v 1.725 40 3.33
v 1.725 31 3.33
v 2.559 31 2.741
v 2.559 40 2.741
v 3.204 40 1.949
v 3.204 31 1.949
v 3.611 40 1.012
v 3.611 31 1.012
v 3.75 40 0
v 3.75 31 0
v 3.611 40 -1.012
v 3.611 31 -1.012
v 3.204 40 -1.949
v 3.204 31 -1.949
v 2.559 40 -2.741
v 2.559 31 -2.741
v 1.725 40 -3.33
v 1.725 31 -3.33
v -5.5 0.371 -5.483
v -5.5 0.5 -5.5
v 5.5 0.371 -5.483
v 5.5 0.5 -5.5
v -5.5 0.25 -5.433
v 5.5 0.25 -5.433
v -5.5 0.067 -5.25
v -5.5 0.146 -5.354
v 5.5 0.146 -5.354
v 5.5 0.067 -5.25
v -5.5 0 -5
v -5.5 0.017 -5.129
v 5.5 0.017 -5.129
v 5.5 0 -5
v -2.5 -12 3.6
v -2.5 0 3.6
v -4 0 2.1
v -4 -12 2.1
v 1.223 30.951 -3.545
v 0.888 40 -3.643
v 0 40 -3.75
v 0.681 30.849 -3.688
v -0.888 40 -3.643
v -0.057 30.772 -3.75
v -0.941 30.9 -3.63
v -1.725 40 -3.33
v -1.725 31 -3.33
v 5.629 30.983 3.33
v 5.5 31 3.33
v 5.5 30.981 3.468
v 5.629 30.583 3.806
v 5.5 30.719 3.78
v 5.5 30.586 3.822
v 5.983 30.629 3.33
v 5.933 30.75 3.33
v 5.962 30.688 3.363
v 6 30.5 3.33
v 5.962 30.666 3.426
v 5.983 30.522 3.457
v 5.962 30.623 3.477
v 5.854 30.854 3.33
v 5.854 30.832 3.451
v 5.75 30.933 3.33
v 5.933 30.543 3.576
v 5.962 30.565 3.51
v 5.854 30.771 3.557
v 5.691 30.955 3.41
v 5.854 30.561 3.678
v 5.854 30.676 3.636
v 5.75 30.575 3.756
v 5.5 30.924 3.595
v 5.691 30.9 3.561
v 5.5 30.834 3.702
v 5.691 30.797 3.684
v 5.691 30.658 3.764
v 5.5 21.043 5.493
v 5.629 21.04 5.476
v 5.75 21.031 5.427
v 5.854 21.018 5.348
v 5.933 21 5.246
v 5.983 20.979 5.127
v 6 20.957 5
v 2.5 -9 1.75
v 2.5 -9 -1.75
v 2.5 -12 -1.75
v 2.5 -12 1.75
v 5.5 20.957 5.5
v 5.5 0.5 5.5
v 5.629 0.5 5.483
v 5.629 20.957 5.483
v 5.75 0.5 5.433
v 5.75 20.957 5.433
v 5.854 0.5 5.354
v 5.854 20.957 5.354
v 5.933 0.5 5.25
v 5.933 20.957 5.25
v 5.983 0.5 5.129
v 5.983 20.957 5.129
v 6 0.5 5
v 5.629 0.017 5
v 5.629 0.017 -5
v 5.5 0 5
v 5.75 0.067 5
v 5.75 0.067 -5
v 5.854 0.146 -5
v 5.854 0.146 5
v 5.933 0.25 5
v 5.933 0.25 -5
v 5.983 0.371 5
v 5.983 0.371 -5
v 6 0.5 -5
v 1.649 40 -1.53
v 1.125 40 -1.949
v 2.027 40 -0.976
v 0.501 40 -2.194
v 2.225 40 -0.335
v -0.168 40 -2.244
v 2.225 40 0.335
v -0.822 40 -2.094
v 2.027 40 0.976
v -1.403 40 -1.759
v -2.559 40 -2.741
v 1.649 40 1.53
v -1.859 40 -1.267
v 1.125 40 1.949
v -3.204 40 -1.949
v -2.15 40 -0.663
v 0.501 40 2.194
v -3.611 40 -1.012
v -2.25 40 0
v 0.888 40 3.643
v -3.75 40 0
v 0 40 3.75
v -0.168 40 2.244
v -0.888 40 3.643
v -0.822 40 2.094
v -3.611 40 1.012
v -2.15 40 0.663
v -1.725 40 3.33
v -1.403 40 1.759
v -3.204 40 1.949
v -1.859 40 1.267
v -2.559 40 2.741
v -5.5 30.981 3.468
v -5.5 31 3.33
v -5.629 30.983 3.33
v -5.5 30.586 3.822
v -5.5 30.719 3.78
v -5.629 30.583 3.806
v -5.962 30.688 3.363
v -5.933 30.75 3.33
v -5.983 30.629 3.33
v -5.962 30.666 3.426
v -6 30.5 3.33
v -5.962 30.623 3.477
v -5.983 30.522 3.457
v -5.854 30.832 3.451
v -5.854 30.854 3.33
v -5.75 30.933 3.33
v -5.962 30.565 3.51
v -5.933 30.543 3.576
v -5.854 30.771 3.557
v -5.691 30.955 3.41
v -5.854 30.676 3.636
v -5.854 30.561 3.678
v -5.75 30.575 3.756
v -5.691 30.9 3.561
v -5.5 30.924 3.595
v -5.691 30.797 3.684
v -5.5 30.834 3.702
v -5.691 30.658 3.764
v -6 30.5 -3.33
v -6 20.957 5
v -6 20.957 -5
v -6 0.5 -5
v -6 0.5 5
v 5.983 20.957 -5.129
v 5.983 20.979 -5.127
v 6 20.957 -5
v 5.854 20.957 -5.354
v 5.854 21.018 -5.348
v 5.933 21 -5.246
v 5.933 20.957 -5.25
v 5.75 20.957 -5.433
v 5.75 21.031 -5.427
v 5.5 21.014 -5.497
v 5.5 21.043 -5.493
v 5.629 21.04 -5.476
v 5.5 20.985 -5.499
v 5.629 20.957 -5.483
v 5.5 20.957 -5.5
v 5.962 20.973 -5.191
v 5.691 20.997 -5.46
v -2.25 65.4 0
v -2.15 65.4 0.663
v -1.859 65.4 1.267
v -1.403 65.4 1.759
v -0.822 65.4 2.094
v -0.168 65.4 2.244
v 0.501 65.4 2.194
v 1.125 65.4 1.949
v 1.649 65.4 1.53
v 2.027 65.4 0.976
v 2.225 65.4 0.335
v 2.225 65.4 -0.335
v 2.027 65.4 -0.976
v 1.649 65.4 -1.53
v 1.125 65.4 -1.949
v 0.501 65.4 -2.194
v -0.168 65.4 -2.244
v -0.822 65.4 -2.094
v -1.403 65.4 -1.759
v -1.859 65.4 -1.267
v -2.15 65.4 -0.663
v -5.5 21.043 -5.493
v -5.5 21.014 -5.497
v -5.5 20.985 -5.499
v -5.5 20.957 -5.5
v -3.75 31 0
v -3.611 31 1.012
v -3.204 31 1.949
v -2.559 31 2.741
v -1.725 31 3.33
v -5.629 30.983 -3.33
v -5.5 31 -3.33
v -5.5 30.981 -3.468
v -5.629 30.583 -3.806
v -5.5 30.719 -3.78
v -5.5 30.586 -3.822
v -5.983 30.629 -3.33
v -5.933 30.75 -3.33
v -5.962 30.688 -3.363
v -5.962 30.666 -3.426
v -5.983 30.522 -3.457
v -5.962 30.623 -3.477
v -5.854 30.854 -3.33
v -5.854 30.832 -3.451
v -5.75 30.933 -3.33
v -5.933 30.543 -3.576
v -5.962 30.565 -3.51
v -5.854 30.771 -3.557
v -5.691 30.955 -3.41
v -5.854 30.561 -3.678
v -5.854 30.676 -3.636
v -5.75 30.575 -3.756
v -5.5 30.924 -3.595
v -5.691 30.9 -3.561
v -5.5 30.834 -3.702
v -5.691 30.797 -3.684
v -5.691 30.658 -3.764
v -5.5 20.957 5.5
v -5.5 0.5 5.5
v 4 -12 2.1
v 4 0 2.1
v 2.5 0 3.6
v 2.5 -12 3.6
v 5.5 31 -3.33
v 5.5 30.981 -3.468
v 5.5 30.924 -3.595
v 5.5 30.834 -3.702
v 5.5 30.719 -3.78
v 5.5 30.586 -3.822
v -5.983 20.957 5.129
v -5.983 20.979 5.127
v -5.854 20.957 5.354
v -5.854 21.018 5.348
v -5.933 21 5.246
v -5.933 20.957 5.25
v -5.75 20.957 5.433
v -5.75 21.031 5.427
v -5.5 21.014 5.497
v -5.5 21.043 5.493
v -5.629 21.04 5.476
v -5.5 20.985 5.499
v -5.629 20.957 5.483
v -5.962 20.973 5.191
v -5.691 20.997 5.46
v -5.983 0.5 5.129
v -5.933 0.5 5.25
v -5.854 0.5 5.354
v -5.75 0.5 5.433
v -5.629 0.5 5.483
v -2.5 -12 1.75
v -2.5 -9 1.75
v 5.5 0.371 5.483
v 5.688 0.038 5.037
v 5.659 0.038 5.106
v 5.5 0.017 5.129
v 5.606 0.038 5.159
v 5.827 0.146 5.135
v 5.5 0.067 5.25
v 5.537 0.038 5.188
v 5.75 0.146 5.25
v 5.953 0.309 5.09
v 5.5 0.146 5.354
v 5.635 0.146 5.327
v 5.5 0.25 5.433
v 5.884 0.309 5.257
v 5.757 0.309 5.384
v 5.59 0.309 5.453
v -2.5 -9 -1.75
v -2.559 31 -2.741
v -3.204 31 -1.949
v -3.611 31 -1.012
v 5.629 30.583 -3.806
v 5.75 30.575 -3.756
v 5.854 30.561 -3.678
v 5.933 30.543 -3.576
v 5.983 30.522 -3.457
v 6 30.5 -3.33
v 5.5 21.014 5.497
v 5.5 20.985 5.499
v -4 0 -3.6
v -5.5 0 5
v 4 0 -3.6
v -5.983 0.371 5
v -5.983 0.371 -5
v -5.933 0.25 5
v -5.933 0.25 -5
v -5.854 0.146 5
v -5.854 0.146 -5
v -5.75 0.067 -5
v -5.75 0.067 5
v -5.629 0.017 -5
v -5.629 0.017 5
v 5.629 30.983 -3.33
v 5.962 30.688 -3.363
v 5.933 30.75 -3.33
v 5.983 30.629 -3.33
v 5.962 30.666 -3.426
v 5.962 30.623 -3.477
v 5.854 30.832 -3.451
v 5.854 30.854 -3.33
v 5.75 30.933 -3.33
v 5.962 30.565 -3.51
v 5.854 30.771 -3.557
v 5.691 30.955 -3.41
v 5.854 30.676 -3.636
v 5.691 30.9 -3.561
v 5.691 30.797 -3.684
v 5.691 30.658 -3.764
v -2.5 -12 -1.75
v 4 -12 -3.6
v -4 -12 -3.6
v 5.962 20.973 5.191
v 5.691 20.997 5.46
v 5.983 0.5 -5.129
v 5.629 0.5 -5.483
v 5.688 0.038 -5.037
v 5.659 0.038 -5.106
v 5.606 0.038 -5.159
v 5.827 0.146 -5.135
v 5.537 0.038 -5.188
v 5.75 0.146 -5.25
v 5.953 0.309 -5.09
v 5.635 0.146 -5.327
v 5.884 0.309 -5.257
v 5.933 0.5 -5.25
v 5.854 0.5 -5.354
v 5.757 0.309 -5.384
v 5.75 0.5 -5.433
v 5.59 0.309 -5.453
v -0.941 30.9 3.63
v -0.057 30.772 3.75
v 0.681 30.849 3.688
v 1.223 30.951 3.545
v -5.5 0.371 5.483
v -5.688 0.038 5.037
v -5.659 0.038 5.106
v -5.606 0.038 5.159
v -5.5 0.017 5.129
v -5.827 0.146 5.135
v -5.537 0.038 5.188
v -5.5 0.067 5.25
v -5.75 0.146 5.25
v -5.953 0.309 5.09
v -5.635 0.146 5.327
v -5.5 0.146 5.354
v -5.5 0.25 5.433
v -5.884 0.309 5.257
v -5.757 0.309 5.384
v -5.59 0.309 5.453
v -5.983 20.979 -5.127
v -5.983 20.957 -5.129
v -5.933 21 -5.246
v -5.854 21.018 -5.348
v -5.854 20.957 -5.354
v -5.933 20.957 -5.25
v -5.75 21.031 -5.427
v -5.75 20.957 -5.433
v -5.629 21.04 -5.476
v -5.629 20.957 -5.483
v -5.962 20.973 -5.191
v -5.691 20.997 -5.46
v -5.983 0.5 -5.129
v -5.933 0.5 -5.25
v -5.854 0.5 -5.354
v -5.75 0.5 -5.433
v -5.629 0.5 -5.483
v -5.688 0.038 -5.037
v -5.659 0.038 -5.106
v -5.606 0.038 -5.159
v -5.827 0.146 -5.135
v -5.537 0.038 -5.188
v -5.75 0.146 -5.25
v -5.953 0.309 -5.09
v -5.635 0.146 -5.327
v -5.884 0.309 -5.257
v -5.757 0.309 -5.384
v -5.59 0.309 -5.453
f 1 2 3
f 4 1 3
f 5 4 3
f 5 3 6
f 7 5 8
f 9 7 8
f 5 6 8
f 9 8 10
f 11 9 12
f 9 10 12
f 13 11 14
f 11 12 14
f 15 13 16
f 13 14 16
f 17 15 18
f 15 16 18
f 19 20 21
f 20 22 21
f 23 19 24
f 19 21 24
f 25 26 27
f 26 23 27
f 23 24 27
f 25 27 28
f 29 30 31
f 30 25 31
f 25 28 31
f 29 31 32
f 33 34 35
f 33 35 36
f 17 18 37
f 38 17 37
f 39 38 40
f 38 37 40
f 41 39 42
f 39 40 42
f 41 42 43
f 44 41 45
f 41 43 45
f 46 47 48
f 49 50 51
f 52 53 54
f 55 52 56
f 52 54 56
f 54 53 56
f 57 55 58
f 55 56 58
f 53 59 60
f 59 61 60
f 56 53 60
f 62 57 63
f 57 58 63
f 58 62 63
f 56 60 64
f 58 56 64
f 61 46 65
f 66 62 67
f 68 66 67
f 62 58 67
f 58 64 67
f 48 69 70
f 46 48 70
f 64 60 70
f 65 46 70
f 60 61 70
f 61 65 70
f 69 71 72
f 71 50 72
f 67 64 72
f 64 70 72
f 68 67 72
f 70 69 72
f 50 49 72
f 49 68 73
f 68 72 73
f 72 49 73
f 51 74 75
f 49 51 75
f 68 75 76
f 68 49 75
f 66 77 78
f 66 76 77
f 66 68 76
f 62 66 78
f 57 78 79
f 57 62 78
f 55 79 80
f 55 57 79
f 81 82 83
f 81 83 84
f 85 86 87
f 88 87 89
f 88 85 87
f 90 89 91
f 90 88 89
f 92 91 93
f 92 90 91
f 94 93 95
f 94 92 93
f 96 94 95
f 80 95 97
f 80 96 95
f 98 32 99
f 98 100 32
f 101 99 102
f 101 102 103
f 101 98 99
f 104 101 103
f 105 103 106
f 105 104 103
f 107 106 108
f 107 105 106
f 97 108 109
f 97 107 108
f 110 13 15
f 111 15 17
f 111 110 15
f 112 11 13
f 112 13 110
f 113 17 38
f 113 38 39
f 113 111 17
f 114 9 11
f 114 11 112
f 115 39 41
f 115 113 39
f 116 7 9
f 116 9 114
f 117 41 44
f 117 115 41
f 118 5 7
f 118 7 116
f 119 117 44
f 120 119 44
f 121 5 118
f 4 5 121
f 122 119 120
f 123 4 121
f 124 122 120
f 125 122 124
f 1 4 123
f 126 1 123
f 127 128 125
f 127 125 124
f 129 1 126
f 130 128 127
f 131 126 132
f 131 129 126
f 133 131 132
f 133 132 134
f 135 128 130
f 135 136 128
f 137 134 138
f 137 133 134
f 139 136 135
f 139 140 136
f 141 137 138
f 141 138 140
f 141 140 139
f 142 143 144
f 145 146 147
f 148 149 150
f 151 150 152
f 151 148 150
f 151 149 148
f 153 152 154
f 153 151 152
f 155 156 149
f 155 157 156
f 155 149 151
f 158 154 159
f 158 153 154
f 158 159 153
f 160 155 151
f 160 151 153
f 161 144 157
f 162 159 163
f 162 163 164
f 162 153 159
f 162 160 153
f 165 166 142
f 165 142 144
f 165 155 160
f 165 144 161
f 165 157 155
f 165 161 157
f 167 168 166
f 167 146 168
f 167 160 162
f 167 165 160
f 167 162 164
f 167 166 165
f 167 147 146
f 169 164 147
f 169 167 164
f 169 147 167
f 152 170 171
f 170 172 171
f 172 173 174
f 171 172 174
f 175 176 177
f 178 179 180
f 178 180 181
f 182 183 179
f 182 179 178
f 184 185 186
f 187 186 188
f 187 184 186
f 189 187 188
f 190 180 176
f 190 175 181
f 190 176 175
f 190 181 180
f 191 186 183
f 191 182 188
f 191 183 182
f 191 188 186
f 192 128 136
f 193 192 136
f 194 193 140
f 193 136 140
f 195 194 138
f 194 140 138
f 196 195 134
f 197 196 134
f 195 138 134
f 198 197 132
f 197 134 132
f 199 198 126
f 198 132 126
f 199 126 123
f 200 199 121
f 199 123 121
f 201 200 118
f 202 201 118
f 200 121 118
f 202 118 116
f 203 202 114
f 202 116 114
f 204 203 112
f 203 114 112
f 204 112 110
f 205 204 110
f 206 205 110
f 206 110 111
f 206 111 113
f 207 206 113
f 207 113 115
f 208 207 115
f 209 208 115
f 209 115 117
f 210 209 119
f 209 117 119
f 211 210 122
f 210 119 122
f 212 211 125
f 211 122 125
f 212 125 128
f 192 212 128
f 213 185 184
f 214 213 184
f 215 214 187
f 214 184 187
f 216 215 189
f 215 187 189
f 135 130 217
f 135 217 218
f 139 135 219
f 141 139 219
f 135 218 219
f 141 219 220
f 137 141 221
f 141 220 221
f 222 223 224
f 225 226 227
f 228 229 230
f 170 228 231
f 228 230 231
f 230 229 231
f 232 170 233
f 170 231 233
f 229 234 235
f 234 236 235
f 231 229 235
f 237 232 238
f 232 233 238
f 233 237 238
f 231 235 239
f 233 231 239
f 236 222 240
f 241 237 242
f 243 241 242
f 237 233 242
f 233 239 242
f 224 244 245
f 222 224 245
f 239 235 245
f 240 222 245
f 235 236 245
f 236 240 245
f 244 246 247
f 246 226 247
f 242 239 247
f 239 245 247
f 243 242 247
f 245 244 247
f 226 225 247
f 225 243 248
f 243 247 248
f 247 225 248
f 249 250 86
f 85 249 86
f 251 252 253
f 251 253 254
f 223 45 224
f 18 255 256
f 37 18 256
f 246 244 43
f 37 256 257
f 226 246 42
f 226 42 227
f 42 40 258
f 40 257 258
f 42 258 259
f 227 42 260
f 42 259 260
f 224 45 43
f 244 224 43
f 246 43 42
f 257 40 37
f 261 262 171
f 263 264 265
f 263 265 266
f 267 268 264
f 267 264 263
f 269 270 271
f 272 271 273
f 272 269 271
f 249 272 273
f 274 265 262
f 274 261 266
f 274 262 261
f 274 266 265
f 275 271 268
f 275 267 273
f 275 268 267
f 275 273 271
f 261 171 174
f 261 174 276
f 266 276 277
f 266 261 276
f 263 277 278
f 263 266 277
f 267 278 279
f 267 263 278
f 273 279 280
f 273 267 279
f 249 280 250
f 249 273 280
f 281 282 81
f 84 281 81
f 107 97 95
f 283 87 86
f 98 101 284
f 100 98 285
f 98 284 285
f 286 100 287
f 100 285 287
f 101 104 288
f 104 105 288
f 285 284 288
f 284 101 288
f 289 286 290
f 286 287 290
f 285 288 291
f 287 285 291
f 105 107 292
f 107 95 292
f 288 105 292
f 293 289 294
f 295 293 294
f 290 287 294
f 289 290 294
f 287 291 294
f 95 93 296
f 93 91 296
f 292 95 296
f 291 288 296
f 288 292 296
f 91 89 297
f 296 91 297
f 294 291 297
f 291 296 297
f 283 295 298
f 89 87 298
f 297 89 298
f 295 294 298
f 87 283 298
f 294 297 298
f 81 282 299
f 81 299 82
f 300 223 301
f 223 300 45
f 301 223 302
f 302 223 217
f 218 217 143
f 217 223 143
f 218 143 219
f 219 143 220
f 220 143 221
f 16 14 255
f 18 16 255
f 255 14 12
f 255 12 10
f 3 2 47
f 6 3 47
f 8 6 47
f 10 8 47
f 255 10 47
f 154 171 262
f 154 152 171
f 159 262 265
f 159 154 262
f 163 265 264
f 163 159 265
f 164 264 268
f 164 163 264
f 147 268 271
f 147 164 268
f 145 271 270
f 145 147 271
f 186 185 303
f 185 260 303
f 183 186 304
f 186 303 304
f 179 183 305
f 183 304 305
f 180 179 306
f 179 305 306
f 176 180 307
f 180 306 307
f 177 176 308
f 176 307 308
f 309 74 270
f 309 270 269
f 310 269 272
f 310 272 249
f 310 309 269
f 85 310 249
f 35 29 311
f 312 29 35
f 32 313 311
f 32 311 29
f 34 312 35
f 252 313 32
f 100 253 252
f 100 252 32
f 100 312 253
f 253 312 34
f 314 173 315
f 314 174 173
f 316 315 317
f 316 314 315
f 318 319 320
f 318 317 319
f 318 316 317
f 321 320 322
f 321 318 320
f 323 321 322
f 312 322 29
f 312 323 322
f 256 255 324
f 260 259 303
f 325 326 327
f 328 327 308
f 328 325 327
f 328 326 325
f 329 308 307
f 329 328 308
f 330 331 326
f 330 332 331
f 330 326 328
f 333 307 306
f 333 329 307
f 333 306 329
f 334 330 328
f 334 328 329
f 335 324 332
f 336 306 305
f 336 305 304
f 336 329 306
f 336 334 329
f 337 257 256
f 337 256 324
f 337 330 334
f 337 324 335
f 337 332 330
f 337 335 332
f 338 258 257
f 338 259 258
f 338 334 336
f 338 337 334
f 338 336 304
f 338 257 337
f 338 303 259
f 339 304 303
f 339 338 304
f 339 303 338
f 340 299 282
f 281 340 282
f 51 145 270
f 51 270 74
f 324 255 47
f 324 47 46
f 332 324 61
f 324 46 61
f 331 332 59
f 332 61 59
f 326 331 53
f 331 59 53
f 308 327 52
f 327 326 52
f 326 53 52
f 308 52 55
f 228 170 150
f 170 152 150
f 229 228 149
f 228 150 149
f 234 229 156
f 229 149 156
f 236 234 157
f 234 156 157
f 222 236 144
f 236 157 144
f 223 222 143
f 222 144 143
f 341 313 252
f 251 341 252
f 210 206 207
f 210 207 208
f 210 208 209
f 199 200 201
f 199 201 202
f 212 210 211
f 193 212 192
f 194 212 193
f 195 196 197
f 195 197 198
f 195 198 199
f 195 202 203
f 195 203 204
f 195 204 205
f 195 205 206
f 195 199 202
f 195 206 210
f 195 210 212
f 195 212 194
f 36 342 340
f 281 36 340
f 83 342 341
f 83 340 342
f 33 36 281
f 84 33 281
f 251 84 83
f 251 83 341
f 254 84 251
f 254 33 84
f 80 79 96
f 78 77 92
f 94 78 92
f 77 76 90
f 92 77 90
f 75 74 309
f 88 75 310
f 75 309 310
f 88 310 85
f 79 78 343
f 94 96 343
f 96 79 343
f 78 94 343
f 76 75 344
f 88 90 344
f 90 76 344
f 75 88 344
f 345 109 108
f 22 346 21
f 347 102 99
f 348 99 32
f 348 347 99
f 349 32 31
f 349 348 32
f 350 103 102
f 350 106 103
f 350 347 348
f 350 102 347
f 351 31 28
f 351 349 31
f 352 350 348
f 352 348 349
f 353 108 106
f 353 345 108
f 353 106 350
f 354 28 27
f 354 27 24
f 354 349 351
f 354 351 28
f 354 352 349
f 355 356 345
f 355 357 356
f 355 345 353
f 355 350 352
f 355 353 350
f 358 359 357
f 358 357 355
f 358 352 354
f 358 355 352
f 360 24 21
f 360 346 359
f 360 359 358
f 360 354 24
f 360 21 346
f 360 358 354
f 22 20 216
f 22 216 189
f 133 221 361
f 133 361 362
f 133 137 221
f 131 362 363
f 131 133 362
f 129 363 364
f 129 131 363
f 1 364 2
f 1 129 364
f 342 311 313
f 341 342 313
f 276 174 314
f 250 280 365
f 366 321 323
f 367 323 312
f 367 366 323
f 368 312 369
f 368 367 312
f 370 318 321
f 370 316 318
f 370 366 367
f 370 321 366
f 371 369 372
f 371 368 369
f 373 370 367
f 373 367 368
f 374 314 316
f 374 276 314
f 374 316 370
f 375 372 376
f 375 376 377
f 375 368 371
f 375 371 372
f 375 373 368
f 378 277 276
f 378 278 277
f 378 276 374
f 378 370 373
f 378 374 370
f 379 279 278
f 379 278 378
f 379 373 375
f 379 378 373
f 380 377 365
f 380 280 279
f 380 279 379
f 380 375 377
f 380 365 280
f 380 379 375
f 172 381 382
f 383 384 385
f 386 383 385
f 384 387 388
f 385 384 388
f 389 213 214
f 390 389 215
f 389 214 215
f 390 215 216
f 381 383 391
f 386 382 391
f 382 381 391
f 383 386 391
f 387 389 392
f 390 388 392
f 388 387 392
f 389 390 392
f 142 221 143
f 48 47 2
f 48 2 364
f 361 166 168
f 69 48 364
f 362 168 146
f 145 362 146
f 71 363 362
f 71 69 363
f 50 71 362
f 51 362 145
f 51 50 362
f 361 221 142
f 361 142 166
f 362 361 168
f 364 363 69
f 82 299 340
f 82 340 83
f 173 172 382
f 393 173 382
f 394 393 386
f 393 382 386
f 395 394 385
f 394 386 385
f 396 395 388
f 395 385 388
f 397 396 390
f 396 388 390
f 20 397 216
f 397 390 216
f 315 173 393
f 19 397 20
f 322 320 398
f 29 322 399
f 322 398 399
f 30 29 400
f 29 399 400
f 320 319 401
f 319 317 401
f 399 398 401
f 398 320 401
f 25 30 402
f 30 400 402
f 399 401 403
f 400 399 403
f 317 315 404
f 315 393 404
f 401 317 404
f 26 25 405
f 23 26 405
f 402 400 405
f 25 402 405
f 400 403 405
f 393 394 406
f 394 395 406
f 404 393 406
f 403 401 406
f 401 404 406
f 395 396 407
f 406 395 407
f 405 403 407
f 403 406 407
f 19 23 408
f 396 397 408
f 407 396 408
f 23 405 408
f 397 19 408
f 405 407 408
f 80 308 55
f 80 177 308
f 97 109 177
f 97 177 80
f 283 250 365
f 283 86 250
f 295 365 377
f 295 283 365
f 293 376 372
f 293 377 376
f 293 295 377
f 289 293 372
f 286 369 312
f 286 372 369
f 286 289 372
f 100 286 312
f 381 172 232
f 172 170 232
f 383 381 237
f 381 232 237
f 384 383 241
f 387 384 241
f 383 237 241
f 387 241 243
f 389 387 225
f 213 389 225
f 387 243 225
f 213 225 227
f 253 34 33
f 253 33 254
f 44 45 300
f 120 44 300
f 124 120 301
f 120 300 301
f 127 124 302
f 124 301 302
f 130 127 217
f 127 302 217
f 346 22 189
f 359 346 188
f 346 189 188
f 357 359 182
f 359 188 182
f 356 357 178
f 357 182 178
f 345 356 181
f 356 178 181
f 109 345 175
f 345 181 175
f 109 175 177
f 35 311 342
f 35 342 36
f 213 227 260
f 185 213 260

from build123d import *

# Parameters (mm, degrees)
F0_W          = 8
F0_H          = 7.2
F0_W_2        = 5
F0_H_2        = 3.5
F1_DEPTH      = 12
F2_DEPTH      = 9
F3_SIZE       = 1.5
F0_W_3        = 12
F0_H_3        = 11
F4_DEPTH      = 31
F5_SIZE2      = 1.75
F5_SIZE       = 10
F5_2_SIZE2    = 1.75
F5_2_SIZE     = 10
F6_R          = 0.5
F8_DEPTH      = 9
F8_DEPTH_BACK = 0.2288594728
F9_R          = 2.25
F10_DEPTH     = 25.4


with BuildPart() as f1:
    # F0 (on Front) → F1 (new body)
    with BuildSketch(Plane.XZ):
        Rectangle(F0_W, F0_H)
        Rectangle(F0_W_2, F0_H_2, mode=Mode.SUBTRACT)
    extrude(amount=F1_DEPTH)

    # F0 (on Front) → F2 (join)
    with BuildSketch(Plane.XZ):
        Rectangle(F0_W_2, F0_H_2)
    extrude(amount=F2_DEPTH)

    # F3
    f3_edges = [f1.edges().sort_by_distance(p)[0] for p in [
        (-4, -6, 3.6),
        (4, -6, 3.6),
    ]]
    chamfer(f3_edges, length=F3_SIZE)

    # F0 (on Front) → F4 (join)
    with BuildSketch(Plane.XZ):
        Rectangle(F0_W_3, F0_H_3)
        Rectangle(F0_W, F0_H, mode=Mode.SUBTRACT)
        Rectangle(F0_W, F0_H)
        Rectangle(F0_W_2, F0_H_2, mode=Mode.SUBTRACT)
        Rectangle(F0_W_2, F0_H_2)
    extrude(amount=-F4_DEPTH)

    # F5
    f5_edges = [f1.edges().sort_by_distance(p)[0] for p in [
        (0, 31, 5.5),
    ]]
    f5_side = f1.faces().sort_by_distance((0, 15.5, 5.5))[0]
    chamfer(f5_edges, length=F5_SIZE, length2=F5_SIZE2, reference=f5_side)

    # F5#2
    f5_2_edges = [f1.edges().sort_by_distance(p)[0] for p in [
        (0, 31, -5.5),
    ]]
    f5_2_side = f1.faces().sort_by_distance((0, 15.5, -5.5))[0]
    chamfer(f5_2_edges, length=F5_2_SIZE, length2=F5_2_SIZE2, reference=f5_2_side)

    # F6
    f6_edges = [f1.edges().sort_by_distance(p)[0] for p in [
        (-6, 31, 0),
        (-6, 26, -4.625),
        (-6, 26, 4.625),
        (-6, 10.5, -5.5),
        (-6, 10.5, 5.5),
        (-6, 0, 0),
        (6, 31, 0),
        (6, 26, -4.625),
        (6, 26, 4.625),
        (6, 10.5, -5.5),
        (6, 10.5, 5.5),
        (6, 0, 0),
        (0, 21, 5.5),
        (0, 0, 5.5),
        (0, 21, -5.5),
        (0, 0, -5.5),
        (0, 31, -3.75),
        (0, 31, 3.75),
    ]]
    fillet(f6_edges, radius=F6_R)

    # F7 (on face) → F8 (join, two sides)
    with BuildSketch(Plane(origin=(0, 31, 0), x_dir=(-1, 0, 0), z_dir=(0, 1, 0))) as f8_sk:
        with BuildLine():
            Line((-1.7246031672, 3.3299014874), (1.7246031672, 3.3299014874))
            ThreePointArc((1.7246031672, 3.3299014874), (0, 3.75), (-1.7246031672, 3.3299014874))
        make_face()
        with BuildLine():
            ThreePointArc((1.7246031672, -3.3299014874), (3.203885288, -1.9487480754), (3.75, 0))
            ThreePointArc((3.75, 0), (3.203885288, 1.9487480754), (1.7246031672, 3.3299014874))
            Line((1.7246031672, 3.3299014874), (-1.7246031672, 3.3299014874))
            ThreePointArc((-1.7246031672, 3.3299014874), (-3.75, 0), (-1.7246031672, -3.3299014874))
            Line((-1.7246031672, -3.3299014874), (1.7246031672, -3.3299014874))
        make_face()
        with BuildLine():
            ThreePointArc((-1.7246031672, -3.3299014874), (0, -3.75), (1.7246031672, -3.3299014874))
            Line((1.7246031672, -3.3299014874), (-1.7246031672, -3.3299014874))
        make_face()
    extrude(amount=F8_DEPTH)
    extrude(f8_sk.sketch, amount=-F8_DEPTH_BACK)

    # F9 (on face) → F10 (join)
    with BuildSketch(Plane(origin=(0, 40, 0), x_dir=(-1, 0, 0), z_dir=(0, 1, 0))):
        Circle(F9_R)
    extrude(amount=F10_DEPTH)


solid = f1.part
